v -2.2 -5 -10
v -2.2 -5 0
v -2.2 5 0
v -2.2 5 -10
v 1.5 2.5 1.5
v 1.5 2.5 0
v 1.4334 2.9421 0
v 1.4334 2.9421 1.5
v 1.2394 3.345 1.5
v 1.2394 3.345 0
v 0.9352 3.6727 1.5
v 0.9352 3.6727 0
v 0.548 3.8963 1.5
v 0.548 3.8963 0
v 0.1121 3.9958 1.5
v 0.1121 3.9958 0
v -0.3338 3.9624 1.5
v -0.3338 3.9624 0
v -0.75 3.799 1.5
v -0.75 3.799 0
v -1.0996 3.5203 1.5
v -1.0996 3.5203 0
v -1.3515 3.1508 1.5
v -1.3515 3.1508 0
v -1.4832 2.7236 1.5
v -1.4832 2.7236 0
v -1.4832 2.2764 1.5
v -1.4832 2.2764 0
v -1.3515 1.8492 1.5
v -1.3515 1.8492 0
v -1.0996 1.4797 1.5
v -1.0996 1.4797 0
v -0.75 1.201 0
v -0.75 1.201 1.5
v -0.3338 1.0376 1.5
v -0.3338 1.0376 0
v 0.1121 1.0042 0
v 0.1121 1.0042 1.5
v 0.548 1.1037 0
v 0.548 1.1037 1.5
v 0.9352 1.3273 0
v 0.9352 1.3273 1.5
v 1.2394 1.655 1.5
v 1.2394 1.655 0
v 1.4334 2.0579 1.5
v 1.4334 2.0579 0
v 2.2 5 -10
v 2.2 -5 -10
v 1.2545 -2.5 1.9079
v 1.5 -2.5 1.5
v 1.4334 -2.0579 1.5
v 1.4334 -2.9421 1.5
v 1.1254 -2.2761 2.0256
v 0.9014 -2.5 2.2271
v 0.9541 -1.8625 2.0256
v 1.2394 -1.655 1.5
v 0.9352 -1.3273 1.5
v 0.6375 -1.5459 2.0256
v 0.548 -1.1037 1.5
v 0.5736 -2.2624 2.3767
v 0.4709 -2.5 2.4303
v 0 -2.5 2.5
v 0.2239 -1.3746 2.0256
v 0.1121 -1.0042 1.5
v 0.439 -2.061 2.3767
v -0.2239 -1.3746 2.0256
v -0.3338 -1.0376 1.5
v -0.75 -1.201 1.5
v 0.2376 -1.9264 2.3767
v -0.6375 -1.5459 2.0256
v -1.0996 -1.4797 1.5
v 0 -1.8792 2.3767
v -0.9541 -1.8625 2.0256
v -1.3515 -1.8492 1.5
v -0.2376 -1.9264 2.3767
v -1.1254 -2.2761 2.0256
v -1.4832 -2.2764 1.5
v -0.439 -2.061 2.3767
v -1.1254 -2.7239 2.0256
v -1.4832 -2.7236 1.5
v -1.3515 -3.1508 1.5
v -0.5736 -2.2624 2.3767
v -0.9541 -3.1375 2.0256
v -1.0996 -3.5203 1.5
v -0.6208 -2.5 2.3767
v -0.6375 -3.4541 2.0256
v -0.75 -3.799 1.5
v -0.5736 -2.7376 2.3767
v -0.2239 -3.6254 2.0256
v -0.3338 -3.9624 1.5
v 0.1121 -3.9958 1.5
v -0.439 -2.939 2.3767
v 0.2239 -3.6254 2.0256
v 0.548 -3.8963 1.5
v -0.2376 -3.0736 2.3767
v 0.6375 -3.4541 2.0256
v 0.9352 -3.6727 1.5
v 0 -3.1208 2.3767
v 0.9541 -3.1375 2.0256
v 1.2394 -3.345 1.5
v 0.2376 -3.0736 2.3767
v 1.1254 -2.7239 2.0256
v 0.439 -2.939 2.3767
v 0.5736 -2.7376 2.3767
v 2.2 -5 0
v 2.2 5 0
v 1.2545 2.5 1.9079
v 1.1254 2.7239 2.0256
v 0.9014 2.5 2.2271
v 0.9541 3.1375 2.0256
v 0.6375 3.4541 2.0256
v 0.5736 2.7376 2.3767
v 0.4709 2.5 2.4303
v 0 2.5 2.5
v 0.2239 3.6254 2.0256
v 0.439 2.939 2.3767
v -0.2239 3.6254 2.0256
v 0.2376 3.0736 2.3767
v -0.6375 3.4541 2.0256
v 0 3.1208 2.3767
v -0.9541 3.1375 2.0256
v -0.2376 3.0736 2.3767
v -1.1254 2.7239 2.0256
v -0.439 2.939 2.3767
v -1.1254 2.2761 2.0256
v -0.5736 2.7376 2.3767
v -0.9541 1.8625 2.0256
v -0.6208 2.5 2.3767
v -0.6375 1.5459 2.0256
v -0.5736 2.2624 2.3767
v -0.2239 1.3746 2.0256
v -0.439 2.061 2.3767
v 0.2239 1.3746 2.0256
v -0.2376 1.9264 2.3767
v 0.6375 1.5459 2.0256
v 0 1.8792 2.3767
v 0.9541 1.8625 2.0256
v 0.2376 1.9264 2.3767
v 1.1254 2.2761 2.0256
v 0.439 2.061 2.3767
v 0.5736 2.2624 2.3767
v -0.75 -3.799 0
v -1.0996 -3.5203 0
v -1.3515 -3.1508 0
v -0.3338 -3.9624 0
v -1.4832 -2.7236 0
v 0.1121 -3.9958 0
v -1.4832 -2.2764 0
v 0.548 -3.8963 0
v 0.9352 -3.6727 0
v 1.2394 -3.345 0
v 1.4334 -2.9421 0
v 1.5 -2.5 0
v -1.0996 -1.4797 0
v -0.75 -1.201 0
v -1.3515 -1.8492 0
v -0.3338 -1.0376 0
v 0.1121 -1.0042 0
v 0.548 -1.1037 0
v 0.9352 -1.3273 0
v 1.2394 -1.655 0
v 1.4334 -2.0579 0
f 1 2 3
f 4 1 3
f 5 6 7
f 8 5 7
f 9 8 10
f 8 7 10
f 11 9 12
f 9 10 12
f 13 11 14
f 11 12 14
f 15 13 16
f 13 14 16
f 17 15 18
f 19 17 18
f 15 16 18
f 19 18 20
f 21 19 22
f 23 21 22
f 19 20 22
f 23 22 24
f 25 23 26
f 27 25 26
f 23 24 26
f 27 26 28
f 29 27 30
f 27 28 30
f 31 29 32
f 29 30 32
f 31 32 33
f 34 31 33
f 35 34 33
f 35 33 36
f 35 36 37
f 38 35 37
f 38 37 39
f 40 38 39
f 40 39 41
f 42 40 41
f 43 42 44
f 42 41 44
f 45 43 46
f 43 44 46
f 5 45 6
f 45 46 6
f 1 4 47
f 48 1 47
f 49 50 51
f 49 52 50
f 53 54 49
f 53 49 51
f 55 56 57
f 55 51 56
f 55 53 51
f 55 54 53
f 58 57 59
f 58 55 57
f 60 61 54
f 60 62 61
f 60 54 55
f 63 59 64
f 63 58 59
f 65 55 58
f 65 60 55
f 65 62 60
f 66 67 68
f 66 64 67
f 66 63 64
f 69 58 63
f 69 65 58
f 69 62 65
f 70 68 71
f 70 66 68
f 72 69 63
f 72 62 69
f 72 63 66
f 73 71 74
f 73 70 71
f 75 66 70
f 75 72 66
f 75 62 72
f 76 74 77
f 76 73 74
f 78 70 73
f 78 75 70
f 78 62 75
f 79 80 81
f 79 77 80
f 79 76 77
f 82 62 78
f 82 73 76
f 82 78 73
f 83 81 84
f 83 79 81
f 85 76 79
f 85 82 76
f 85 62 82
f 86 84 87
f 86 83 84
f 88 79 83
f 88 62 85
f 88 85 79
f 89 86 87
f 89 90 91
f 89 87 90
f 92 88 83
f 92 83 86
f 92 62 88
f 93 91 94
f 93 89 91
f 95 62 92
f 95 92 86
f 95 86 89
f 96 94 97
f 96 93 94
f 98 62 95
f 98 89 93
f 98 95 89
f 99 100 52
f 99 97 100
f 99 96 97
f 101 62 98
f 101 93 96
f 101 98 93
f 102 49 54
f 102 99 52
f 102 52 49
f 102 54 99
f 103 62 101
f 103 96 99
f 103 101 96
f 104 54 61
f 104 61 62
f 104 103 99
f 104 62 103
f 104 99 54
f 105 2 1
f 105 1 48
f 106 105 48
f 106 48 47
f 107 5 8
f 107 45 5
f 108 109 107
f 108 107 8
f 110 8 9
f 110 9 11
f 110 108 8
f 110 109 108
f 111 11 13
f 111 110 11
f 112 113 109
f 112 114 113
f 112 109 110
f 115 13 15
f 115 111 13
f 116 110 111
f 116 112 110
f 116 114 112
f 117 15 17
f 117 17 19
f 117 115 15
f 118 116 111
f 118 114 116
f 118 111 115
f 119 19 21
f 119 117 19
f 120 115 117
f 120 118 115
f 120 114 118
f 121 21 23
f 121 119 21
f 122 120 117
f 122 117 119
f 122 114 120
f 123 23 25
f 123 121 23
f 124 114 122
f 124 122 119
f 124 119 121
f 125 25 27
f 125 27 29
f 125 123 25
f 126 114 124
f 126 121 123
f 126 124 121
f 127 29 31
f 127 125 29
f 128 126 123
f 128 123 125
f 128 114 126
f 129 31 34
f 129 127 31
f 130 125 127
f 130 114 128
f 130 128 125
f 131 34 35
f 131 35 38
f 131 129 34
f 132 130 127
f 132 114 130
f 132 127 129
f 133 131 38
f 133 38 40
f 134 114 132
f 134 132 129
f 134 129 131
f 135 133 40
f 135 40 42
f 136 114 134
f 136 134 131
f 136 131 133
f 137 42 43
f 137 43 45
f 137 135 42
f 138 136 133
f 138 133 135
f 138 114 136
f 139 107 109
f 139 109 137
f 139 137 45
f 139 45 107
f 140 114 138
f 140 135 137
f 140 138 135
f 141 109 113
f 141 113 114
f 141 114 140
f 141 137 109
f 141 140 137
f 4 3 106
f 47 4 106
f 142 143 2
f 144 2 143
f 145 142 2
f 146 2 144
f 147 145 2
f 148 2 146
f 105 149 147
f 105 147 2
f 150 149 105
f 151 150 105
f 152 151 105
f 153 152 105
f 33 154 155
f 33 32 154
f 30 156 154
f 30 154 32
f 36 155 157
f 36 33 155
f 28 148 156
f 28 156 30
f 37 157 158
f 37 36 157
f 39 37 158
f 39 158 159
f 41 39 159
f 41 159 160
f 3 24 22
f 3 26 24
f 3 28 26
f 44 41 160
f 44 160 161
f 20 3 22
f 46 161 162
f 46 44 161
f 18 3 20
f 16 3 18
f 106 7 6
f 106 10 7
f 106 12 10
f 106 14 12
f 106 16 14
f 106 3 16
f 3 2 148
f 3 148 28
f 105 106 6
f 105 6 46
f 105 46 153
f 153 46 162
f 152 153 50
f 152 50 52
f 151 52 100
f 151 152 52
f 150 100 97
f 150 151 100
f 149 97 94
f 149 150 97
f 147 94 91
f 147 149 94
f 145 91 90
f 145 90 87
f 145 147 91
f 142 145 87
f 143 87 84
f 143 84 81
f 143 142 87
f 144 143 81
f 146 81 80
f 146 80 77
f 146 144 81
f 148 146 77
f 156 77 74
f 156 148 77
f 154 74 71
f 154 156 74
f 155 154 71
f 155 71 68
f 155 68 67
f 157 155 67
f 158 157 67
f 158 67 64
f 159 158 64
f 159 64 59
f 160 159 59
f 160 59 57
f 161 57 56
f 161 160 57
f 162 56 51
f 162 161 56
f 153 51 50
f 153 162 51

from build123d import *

# Parameters (mm, degrees)
SKETCH1_W                  = 4.4
SKETCH1_H                  = 10
BOSS_EXTRUDE1_DEPTH        = 10
SKETCH2_R                  = 1.5
BOSS_EXTRUDE2_DEPTH        = 1.5
DOME1_FACE_RADIUS          = 1.5
DOME1_HEIGHT               = 1
MIRROR1_COPY_1_FACE_RADIUS = 1.5
MIRROR1_COPY_1_HEIGHT      = 1


with BuildPart() as part:
    # Sketch1 → Boss-Extrude1 (new body)
    with BuildSketch(Plane.XY):
        Rectangle(SKETCH1_W, SKETCH1_H)
    extrude(amount=-BOSS_EXTRUDE1_DEPTH)

    # Sketch2 → Boss-Extrude2 (add)
    with BuildSketch(Plane.XY):
        with Locations((0, 2.5)):
            Circle(SKETCH2_R)
    boss_extrude2 = extrude(amount=BOSS_EXTRUDE2_DEPTH)

    # Dome1: a dome of height H over a round flat face of radius A is a cap of a sphere of radius (A * A + H * H) / (2 * H)
    dome1_r = (DOME1_FACE_RADIUS * DOME1_FACE_RADIUS + DOME1_HEIGHT * DOME1_HEIGHT) / (2 * DOME1_HEIGHT)
    dome1_base = Plane((0, 2.5, 1.5), z_dir=(0, 0, 1))
    with Locations(dome1_base.offset(DOME1_HEIGHT - dome1_r)):
        dome1_ball = Sphere(dome1_r, mode=Mode.PRIVATE)
    add(split(dome1_ball, bisect_by=dome1_base, keep=Keep.TOP, mode=Mode.PRIVATE))

    # Mirror1: Boss-Extrude2 across plane
    add(boss_extrude2.mirror(Plane.ZX))

    # Mirror1 copy 1: a dome of height H over a round flat face of radius A is a cap of a sphere of radius (A * A + H * H) / (2 * H)
    mirror1_copy_1_r = (MIRROR1_COPY_1_FACE_RADIUS * MIRROR1_COPY_1_FACE_RADIUS + MIRROR1_COPY_1_HEIGHT * MIRROR1_COPY_1_HEIGHT) / (2 * MIRROR1_COPY_1_HEIGHT)
    mirror1_copy_1_base = Plane((0, -2.5, 1.5), z_dir=(0, 0, 1))
    with Locations(mirror1_copy_1_base.offset(MIRROR1_COPY_1_HEIGHT - mirror1_copy_1_r)):
        mirror1_copy_1_ball = Sphere(mirror1_copy_1_r, mode=Mode.PRIVATE)
    add(split(mirror1_copy_1_ball, bisect_by=mirror1_copy_1_base, keep=Keep.TOP, mode=Mode.PRIVATE))


solid = part.part
